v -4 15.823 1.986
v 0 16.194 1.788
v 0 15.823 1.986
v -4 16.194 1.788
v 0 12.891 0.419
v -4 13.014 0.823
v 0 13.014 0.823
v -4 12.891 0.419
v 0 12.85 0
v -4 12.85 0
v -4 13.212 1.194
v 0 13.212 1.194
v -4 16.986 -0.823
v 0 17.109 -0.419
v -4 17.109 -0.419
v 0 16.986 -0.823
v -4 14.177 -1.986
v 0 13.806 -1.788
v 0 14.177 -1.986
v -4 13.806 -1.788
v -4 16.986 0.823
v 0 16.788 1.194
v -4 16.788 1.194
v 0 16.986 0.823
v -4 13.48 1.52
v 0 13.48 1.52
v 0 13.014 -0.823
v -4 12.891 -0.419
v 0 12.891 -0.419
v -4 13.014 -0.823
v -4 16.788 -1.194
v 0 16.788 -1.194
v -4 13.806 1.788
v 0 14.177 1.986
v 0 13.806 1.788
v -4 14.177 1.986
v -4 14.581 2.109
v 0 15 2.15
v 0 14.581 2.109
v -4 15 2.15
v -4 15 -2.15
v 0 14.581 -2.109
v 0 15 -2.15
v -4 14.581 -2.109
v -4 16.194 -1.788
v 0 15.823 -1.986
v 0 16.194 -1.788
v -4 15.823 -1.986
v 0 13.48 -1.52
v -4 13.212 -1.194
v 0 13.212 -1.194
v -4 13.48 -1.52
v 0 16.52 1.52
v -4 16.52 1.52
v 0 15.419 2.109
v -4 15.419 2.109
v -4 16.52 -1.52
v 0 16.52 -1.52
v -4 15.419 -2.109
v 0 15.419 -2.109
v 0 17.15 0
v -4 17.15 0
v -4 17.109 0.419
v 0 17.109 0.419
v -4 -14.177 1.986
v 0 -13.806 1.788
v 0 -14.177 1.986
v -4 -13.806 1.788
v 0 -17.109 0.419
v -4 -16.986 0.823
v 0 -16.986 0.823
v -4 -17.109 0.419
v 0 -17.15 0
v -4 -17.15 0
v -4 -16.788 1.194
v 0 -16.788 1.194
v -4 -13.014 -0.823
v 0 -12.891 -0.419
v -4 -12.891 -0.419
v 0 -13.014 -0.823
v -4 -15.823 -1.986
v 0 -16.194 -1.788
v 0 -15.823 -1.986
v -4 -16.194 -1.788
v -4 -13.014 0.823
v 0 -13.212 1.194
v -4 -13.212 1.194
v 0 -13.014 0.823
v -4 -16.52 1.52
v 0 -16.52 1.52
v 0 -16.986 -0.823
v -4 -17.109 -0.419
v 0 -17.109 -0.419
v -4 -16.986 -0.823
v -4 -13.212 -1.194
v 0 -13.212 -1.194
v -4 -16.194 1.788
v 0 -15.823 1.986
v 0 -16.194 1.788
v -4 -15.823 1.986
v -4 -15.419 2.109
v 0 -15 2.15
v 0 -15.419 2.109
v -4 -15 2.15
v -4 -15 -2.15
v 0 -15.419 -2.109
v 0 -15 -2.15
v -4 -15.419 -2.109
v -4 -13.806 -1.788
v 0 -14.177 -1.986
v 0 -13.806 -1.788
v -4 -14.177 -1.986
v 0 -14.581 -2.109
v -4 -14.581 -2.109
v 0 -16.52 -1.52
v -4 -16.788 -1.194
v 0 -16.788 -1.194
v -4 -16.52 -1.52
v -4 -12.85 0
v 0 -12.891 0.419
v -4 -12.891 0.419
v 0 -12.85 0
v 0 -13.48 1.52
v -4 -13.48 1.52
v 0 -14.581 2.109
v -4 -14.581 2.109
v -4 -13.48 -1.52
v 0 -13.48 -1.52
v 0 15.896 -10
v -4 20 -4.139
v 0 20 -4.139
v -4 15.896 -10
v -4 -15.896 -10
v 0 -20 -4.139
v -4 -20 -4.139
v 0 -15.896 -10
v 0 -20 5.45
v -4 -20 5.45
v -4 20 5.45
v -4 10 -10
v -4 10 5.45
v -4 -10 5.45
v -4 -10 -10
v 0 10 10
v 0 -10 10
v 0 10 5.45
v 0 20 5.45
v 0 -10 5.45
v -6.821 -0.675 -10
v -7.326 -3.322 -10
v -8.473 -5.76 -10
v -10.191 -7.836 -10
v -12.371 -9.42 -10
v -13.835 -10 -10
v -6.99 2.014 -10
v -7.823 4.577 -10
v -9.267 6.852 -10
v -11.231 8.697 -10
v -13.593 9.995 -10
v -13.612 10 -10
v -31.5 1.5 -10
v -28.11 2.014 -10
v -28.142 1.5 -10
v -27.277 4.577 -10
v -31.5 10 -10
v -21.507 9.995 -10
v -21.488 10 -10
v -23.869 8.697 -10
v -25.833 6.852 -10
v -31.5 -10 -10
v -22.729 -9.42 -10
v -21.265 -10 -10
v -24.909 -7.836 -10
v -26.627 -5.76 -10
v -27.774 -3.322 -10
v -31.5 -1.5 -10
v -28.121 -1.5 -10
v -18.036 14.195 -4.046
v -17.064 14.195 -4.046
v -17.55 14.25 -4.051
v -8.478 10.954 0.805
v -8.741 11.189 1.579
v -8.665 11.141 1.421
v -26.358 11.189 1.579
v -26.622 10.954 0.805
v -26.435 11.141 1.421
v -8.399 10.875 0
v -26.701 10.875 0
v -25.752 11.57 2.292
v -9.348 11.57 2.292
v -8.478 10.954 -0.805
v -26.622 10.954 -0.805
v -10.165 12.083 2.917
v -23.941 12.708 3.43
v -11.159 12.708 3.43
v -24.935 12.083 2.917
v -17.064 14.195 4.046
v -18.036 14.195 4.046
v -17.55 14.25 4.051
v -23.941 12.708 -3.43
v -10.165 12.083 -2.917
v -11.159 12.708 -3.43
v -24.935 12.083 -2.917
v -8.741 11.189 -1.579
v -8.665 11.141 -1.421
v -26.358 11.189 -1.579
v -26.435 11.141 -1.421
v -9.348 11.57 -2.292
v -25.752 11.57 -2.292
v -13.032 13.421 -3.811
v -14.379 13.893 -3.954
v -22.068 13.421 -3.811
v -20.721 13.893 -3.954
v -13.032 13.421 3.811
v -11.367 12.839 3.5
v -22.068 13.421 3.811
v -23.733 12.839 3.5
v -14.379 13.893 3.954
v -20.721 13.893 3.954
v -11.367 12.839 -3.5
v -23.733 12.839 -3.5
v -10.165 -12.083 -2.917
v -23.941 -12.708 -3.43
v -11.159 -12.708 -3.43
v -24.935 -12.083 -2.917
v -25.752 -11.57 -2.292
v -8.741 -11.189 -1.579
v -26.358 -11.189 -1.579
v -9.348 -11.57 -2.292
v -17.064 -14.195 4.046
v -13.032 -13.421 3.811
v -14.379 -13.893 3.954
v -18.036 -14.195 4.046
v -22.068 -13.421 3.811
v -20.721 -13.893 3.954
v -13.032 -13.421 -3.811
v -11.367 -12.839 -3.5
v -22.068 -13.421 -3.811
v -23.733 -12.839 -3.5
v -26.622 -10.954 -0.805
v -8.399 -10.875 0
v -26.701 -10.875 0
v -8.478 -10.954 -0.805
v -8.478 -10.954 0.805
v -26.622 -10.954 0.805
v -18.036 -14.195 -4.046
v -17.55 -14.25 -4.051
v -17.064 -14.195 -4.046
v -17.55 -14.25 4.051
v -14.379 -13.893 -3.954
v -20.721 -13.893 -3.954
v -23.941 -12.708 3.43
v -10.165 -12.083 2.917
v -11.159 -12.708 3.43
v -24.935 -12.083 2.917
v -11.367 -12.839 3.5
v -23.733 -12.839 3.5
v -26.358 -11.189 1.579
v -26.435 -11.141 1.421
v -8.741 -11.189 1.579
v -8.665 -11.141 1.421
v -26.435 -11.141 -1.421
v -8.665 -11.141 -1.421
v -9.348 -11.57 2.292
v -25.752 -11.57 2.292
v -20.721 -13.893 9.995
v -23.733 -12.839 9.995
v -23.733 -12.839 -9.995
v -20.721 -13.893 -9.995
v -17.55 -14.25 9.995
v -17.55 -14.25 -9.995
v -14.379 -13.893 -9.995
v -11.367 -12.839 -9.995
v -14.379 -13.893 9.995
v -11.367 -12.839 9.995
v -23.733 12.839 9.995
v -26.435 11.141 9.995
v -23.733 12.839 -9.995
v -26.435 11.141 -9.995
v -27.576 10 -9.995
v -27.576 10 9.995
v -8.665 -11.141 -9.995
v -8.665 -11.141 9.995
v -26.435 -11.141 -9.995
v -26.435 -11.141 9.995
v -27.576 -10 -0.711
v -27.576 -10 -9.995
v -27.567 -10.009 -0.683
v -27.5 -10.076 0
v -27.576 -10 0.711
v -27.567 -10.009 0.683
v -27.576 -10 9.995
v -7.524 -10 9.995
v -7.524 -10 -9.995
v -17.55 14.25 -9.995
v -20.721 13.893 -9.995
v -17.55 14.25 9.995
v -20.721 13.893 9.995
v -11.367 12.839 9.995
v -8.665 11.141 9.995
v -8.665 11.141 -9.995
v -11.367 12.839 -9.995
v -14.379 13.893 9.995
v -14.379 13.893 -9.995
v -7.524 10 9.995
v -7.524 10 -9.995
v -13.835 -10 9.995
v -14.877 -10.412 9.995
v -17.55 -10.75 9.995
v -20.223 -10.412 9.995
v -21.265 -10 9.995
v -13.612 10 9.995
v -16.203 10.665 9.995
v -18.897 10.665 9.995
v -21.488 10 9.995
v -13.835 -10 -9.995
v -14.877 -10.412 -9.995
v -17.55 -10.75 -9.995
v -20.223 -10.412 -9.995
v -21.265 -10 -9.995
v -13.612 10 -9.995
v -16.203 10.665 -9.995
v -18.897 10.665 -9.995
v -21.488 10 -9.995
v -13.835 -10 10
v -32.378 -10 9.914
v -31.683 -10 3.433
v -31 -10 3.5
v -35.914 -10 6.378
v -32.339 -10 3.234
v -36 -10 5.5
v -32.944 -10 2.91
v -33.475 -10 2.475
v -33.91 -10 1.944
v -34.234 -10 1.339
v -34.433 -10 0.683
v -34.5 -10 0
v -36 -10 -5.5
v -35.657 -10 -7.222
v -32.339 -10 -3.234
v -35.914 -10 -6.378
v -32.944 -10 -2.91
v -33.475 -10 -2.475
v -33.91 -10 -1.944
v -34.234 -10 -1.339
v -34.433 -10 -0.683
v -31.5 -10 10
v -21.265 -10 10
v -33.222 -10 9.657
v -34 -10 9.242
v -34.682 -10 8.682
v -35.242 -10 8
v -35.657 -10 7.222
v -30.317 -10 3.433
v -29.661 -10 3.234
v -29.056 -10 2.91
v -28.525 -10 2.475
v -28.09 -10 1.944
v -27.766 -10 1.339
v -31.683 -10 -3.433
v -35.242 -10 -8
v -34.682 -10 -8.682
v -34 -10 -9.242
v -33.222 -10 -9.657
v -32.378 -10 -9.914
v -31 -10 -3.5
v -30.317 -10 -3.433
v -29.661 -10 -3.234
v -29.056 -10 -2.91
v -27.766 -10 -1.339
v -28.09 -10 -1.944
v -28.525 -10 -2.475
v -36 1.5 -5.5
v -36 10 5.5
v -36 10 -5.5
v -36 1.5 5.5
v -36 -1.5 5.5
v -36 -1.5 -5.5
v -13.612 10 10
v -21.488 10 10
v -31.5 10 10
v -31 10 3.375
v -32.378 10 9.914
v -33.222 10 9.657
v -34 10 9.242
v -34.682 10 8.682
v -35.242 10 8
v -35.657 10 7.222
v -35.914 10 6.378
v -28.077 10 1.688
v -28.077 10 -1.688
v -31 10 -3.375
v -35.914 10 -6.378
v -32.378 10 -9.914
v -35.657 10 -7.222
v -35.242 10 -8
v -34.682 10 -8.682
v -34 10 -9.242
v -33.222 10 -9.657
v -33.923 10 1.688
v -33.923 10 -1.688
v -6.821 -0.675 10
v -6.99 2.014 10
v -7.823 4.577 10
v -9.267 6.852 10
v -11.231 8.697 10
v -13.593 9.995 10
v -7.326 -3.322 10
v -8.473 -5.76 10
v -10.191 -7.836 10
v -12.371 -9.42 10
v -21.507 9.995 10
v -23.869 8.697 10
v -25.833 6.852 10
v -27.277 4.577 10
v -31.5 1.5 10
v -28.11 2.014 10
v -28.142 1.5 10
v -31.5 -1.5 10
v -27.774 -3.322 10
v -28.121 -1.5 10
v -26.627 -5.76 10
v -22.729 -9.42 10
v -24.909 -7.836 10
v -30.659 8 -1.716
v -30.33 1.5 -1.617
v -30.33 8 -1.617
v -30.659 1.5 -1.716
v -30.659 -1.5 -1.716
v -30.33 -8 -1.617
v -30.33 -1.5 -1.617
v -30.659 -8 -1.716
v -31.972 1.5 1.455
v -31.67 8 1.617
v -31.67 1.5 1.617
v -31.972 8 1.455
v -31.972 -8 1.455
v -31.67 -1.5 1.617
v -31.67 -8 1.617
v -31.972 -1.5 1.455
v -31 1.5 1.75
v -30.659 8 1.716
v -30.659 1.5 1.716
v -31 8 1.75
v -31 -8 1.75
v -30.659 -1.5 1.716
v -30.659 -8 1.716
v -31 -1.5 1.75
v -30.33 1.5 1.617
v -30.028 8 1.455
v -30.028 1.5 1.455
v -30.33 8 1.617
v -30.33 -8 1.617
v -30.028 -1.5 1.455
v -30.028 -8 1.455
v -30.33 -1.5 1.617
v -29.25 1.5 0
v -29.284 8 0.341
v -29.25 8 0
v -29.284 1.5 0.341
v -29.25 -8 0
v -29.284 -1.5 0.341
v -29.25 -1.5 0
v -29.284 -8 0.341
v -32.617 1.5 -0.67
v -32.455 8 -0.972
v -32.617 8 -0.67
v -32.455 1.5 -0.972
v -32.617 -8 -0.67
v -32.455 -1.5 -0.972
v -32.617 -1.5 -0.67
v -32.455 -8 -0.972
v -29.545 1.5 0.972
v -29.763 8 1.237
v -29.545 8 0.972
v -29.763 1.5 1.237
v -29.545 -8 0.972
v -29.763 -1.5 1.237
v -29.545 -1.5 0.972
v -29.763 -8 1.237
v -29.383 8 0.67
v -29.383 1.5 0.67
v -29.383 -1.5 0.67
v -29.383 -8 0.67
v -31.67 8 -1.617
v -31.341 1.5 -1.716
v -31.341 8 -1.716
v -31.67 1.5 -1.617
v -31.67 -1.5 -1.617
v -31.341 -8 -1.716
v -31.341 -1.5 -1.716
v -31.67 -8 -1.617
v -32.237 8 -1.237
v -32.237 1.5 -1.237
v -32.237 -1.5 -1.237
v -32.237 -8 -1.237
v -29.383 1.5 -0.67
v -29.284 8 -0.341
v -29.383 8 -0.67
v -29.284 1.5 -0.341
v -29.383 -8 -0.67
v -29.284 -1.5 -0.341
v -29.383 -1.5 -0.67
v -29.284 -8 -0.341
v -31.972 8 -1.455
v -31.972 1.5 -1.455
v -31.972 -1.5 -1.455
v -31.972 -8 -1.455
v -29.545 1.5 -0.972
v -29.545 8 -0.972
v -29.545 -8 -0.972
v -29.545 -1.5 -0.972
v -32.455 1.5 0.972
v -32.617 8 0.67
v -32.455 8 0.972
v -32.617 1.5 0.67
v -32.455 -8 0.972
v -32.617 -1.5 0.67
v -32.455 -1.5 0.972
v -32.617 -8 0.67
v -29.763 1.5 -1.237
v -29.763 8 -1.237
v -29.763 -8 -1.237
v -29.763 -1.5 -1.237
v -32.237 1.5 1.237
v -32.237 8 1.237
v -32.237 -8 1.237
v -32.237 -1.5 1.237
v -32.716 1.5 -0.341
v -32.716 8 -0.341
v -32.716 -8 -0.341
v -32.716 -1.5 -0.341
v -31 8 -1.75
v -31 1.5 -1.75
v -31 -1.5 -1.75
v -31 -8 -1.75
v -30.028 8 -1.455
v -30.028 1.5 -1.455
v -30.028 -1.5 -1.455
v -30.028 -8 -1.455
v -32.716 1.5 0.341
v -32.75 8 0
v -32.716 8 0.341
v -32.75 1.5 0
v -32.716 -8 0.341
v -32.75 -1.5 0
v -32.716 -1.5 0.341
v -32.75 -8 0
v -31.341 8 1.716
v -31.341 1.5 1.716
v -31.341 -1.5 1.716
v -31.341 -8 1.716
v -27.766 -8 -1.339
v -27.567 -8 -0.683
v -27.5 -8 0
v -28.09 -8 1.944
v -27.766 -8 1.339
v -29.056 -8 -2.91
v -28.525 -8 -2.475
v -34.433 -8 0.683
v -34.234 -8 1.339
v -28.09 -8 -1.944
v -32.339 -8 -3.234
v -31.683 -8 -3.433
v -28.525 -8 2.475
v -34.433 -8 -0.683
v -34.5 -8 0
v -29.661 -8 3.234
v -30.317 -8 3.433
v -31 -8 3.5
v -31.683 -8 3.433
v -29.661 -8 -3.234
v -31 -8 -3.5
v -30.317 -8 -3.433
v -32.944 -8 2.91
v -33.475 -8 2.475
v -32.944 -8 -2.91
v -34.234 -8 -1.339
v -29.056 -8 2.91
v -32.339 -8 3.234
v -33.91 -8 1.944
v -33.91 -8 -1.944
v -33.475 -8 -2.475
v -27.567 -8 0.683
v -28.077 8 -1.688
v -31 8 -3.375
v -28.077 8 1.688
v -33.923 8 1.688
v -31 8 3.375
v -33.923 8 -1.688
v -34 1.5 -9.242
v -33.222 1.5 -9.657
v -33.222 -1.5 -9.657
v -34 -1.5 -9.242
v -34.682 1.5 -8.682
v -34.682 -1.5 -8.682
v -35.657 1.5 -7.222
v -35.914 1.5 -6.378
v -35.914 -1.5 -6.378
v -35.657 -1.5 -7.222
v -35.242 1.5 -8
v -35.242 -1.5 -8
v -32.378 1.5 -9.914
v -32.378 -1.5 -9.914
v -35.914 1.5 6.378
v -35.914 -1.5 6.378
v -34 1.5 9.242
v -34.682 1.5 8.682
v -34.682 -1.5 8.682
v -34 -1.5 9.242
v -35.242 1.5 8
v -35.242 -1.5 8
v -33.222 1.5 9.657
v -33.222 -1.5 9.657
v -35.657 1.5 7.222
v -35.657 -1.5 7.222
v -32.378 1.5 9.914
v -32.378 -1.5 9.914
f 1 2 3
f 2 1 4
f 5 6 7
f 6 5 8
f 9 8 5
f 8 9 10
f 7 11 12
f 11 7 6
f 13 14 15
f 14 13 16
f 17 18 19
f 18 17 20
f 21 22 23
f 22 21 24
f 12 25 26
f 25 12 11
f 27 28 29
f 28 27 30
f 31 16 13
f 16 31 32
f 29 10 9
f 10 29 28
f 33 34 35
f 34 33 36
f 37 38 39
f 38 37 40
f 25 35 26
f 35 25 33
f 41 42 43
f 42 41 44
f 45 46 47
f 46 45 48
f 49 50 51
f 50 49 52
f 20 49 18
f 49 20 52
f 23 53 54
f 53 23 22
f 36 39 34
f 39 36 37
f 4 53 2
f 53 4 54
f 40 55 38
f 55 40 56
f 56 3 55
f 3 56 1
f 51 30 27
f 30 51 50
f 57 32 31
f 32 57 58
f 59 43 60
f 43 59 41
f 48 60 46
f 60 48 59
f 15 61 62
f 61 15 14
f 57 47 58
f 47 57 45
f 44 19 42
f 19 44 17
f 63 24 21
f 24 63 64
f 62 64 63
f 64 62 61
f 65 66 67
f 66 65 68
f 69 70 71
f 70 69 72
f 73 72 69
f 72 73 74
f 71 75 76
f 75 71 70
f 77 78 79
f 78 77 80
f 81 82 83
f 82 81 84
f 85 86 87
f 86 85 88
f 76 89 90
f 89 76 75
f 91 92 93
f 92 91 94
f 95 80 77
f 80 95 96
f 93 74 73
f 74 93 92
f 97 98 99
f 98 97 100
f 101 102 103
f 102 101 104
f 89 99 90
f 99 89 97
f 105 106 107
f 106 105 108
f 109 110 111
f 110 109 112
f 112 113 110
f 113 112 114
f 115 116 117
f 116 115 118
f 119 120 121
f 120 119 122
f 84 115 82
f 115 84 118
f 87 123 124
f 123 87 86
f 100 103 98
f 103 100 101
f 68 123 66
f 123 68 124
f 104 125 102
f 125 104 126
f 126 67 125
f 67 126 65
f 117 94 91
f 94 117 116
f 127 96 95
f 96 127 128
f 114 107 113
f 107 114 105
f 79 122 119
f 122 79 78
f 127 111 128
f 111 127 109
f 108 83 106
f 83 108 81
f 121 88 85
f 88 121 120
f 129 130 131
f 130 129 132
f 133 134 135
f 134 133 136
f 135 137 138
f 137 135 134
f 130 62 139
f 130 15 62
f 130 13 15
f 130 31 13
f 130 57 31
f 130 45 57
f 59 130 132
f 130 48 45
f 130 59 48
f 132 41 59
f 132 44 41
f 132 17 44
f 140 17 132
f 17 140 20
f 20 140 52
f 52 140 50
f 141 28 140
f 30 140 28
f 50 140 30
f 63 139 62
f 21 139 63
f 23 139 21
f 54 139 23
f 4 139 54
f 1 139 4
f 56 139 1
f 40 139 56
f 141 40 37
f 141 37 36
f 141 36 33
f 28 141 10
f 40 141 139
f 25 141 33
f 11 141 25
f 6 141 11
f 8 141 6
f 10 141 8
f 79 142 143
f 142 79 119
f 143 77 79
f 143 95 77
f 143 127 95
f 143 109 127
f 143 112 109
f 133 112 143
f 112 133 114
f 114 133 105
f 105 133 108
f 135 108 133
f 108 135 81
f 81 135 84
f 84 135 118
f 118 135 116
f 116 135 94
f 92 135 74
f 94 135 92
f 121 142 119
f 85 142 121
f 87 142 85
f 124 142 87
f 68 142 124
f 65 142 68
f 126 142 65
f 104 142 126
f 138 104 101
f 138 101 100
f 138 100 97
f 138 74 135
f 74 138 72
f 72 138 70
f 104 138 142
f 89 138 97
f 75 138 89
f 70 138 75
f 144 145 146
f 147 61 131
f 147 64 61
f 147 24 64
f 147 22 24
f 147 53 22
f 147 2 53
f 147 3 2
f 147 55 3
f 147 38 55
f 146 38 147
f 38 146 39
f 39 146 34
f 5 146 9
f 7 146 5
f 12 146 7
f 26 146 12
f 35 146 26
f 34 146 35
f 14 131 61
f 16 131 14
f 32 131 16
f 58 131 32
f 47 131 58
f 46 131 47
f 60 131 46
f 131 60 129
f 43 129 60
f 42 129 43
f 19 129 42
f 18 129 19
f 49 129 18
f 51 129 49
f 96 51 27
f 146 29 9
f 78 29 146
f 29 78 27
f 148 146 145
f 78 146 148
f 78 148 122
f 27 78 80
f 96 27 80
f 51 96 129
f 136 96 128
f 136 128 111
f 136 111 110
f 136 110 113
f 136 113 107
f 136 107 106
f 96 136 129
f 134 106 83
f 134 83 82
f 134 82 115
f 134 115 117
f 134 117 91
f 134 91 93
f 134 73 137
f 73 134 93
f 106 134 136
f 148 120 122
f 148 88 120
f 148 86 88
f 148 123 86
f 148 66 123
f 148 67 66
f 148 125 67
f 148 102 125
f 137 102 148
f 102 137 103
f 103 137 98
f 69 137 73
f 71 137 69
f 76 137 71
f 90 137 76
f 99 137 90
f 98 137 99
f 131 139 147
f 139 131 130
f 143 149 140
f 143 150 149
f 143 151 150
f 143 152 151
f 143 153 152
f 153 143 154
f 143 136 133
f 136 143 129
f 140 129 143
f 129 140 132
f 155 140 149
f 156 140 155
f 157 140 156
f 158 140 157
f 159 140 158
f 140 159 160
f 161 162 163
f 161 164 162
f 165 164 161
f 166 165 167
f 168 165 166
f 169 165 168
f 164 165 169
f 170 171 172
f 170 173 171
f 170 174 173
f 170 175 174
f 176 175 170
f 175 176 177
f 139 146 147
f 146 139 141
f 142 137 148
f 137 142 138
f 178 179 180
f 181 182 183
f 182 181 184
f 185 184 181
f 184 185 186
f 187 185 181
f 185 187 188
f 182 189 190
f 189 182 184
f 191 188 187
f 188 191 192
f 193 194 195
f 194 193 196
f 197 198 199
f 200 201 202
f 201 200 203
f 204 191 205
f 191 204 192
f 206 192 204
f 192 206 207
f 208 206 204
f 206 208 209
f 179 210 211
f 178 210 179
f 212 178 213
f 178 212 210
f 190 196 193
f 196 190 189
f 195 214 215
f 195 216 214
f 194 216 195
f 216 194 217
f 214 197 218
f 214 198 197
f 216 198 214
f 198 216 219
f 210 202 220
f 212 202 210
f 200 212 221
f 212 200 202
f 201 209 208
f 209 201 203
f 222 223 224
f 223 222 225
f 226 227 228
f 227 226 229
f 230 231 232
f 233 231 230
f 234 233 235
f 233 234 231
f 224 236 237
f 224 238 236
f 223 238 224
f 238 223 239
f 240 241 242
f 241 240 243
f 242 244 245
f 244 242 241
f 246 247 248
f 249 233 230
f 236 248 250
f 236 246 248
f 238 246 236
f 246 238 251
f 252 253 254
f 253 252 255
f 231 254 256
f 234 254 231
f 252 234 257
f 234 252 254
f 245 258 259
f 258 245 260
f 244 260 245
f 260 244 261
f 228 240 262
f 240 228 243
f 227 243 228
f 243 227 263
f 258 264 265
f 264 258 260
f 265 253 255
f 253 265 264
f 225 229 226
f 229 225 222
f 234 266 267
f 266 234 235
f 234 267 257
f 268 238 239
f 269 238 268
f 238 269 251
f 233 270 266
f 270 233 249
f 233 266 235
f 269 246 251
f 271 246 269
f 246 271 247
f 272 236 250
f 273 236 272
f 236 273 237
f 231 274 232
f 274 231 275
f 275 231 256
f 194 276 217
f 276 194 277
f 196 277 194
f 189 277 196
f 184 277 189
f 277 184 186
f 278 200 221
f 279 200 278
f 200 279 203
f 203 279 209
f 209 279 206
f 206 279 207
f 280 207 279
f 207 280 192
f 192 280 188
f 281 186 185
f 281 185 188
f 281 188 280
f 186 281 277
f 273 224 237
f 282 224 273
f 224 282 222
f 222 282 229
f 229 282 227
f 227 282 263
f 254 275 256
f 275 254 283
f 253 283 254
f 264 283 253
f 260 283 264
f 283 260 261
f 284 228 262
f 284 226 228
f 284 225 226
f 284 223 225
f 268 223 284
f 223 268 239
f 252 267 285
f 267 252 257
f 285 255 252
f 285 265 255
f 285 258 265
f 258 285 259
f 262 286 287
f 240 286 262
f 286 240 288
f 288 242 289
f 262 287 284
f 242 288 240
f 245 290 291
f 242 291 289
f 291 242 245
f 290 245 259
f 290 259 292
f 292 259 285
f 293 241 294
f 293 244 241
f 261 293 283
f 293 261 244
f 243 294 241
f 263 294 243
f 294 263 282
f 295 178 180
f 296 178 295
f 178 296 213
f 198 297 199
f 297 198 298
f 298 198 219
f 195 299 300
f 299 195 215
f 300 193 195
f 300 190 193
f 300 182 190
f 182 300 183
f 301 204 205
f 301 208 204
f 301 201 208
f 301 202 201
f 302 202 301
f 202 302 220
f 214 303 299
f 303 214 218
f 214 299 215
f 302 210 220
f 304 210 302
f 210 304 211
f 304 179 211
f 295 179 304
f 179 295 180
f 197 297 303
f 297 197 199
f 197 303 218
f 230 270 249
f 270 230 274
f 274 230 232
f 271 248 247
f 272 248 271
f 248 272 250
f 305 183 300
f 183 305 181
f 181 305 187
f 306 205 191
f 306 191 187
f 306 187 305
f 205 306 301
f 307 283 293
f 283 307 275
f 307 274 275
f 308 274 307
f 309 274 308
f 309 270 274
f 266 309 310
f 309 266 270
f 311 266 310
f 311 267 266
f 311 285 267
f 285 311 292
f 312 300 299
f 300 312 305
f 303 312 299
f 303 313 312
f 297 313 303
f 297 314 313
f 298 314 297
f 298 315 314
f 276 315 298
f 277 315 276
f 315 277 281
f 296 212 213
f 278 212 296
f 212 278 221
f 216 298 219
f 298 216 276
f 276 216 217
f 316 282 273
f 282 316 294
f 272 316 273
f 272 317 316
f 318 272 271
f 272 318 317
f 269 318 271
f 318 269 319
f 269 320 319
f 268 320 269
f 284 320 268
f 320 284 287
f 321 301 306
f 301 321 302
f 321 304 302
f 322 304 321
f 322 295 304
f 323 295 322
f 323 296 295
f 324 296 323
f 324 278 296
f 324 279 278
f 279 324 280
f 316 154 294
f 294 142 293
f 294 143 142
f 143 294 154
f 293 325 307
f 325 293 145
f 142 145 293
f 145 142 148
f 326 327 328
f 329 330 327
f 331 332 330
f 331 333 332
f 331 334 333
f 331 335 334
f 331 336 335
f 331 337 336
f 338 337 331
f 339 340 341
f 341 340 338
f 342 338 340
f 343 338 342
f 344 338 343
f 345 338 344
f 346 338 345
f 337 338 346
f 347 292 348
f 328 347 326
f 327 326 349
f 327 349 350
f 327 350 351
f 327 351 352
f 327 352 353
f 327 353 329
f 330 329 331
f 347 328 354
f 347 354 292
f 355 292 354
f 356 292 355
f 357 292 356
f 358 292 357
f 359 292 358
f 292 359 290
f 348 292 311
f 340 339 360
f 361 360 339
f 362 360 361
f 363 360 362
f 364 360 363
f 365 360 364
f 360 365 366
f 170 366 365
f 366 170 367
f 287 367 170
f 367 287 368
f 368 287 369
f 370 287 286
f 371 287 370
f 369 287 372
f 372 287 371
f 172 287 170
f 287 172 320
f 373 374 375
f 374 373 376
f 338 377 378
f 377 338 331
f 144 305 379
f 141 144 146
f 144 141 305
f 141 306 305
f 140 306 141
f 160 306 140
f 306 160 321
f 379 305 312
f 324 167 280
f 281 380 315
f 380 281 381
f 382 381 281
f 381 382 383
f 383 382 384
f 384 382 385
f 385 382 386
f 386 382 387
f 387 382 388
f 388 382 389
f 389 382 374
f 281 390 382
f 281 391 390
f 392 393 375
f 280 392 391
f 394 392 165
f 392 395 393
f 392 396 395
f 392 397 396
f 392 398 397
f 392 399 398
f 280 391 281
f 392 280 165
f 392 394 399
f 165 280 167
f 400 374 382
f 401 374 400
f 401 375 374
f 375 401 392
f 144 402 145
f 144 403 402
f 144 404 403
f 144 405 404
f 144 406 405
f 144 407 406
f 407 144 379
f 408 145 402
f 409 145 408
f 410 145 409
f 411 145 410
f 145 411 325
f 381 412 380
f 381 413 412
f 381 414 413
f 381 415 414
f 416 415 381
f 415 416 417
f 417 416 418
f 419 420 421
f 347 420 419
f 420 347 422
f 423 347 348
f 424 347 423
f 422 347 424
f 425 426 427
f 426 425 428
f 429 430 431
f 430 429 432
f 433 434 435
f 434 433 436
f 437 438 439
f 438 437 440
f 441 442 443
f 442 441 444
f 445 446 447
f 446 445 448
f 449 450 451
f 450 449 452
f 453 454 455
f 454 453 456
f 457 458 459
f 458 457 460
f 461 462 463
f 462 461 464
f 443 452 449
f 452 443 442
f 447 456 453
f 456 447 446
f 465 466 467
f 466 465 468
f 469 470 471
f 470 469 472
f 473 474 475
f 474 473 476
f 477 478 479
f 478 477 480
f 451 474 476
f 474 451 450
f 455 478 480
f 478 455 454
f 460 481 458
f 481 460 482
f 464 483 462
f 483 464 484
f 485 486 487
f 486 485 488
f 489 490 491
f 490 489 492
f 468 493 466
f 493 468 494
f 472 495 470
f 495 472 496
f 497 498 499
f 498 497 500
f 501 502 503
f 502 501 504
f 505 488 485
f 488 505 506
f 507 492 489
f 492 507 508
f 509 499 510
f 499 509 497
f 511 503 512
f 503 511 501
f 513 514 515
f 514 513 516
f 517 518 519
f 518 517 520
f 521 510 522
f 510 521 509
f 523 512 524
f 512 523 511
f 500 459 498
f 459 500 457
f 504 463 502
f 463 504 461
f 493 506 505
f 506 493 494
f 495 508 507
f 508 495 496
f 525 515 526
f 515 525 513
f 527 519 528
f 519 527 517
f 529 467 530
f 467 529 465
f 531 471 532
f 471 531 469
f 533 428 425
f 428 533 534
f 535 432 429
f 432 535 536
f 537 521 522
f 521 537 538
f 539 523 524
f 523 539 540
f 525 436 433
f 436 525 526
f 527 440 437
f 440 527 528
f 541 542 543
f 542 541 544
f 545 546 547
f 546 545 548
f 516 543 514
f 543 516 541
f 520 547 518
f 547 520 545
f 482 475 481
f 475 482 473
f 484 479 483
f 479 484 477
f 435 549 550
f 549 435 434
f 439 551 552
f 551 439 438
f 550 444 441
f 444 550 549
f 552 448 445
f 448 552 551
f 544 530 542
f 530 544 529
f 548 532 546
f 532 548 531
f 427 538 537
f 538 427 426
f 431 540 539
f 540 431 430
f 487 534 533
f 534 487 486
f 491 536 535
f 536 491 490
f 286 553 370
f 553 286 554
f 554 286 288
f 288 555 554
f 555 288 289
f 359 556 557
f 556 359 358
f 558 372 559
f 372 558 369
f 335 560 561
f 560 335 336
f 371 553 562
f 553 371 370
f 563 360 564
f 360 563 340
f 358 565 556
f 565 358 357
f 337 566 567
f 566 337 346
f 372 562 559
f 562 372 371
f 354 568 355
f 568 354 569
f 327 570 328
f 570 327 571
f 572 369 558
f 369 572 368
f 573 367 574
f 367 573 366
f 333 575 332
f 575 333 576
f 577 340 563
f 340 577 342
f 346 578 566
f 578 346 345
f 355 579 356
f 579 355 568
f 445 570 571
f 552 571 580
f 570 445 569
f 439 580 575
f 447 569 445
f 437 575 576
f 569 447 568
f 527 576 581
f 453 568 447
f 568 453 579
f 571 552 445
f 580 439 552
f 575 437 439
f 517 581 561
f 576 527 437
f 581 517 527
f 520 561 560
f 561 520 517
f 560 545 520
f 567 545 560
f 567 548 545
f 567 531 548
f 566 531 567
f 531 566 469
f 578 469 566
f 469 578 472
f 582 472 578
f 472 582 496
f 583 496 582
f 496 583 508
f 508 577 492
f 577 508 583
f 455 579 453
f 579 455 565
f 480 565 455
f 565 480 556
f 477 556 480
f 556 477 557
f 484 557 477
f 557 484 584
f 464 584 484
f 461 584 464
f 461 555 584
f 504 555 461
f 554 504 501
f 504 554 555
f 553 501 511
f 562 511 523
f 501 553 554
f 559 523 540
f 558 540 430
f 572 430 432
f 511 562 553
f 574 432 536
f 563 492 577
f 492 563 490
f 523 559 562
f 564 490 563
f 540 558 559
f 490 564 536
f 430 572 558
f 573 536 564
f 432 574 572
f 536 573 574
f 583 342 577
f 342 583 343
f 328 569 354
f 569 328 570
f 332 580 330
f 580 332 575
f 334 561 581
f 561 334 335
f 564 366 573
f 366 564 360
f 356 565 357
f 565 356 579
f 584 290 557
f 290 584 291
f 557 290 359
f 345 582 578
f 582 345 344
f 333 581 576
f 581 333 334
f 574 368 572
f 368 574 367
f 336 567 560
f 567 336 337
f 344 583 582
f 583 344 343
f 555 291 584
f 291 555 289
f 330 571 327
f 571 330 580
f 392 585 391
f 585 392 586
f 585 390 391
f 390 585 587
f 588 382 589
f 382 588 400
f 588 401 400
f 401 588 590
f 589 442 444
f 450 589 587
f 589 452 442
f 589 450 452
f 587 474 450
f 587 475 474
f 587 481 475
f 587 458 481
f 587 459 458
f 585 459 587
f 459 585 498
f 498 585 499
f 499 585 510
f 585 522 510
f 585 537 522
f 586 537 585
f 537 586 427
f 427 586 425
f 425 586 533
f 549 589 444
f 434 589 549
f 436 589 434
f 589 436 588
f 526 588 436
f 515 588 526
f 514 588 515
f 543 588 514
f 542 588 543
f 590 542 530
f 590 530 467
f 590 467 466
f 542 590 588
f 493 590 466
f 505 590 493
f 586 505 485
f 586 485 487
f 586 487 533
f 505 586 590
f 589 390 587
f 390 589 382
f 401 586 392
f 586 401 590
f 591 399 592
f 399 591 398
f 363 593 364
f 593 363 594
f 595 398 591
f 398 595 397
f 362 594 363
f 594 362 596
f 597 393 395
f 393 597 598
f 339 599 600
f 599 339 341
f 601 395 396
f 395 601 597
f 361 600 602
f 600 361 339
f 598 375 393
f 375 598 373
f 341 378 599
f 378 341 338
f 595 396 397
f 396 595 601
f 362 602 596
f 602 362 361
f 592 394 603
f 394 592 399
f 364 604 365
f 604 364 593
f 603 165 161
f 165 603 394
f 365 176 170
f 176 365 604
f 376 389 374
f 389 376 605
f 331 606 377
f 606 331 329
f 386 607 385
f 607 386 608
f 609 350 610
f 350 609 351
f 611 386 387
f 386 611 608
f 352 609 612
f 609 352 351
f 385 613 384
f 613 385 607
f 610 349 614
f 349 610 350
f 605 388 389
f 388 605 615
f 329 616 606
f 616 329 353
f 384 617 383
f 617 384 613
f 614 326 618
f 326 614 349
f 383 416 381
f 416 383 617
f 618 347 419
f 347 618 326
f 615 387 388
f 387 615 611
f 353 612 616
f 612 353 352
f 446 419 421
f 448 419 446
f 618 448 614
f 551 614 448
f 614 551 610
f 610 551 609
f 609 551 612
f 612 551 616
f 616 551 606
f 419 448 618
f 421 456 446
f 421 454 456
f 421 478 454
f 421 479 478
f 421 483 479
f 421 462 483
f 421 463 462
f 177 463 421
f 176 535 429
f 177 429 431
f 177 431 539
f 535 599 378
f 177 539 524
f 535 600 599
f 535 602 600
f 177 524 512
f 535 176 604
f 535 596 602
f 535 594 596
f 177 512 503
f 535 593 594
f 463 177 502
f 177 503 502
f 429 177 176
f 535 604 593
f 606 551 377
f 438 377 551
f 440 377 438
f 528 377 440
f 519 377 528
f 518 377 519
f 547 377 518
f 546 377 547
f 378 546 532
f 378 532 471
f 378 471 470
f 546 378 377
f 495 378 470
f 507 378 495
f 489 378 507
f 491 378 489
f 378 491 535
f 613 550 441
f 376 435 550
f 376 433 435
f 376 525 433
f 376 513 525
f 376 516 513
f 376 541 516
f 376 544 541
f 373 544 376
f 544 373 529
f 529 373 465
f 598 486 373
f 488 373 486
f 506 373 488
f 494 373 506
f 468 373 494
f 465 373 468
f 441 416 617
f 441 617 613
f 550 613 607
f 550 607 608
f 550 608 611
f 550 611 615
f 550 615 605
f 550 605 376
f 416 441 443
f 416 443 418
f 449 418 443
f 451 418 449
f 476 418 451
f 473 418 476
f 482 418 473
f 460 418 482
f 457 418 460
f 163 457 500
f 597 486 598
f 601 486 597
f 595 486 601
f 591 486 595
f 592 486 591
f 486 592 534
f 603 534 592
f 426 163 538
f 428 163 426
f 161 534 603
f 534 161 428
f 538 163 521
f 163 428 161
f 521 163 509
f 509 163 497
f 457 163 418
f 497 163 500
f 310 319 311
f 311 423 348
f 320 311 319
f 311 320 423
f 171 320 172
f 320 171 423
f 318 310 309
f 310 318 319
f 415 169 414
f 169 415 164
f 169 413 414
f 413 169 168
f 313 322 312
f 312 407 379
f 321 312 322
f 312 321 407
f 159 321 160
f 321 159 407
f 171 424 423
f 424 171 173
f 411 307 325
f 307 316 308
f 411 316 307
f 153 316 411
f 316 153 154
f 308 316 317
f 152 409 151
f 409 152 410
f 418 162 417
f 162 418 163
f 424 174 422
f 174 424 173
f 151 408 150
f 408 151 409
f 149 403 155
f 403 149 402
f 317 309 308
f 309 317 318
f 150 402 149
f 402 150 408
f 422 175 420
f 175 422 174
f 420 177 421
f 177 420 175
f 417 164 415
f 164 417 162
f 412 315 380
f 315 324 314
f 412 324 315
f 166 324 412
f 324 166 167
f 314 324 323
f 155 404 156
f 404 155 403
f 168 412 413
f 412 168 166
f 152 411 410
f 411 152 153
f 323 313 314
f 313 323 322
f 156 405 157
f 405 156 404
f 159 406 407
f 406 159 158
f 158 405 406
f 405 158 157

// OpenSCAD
lm8uu_length = 15;
lm8luu_length = 45;
lm12uu_length = 20;
height = 36;
lm8uu_diam = 15.5;
lm12uu_diam = 21.5;
extrusion_width = 20;

retaining_hole_offset = 5;
retaining_hole_diam = 3.5;
retaining_hole_countersink_diam = 7;
retaining_hole_countersink_depth = 2;
retaining_hole_nuttrap_depth = 4.1;

//block_width = extrusion_width + extrusion_width/5;
block_width = 20;
barrel_thickness = 7;
barrel_offset = 6+(11.8+11.3)/2;
gap_width = 3;

//mount_width = extrusion_width * 2 + extrusion_width/2;
mount_width = extrusion_width * 2;
mount_height = 4;
mount_length = lm12uu_length/2; // len/2 = center
mount_hole_spacing = extrusion_width*1.5;
mount_hole_diam = 4.3;
mount_screwhead_clearance_diam = 8.25;

corner_round_diam = 9;
DEBUG = 0;

if (true)
{   
    rotate([90 * (1-DEBUG), 0, -90 * (1-DEBUG)])
    lm12uu_holder();
}

module lm8uu_holder()
{
    bearing_holder(length = lm8uu_length);
}

module lm8luu_holder()
{
    bearing_holder(length = lm8luu_length);
}

module lm12uu_holder()
{
    bearing_holder(length = lm12uu_length, diameter = lm12uu_diam);
}

module bearing_holder2(length = lm8uu_length, diameter = lm8uu_diam)
{
        union()
        {
            // main block
            translate([0, 0, height/2])
            cube([block_width, length, height], center=true);

            translate([0, 0, barrel_offset])
            translate([0, -0.05/2, 0])
            rotate([90, 0, 0])
            cylinder(d=diameter + barrel_thickness, h=length-0.05, center=true, $fn=28);
        }
}

module bearing_holder(length = lm8uu_length, diameter = lm8uu_diam)
{
    // mount plate
    color("greenyellow") difference()
    {
        translate([0, 0, mount_height/2])
        cube([mount_width, length, mount_height], center=true);
        
        // mount holes
        for(i=[-1, 1])
            translate([mount_hole_spacing/2*i, -length/2+mount_length, 0])
            cylinder(d=mount_hole_diam, h=50, $fn=32, center=true);
        
        // remove the mount plate above the hole, we don't need it
        translate([0, 50, 0])
        translate([0, mount_hole_diam/2+3.3, 0])
        cube([100, 100, 100], center=true);
        
        // cut the corner at the bottom
        for(i=[-1, 1])
            translate([mount_hole_spacing/2*i, 0, mount_height/2])
            translate([7*i, -length/2, 0])
            rotate([0, 0, -35*i])
            cube([10, 10, mount_height+2], center=true);
    }
    
    color("greenyellow") difference()
    {
        union()
        {
            // main block
            translate([0, 0, height/2])
            cube([block_width, length, height], center=true);

            // barrel
            difference()
            {
                translate([0, 0, barrel_offset])
                rotate([90, 0, 0])
                // need the tiny epsilon to avoid manifold errors in stl
                cylinder(d=diameter+barrel_thickness, h=length-0.01, center=true, $fn=28);
                
                // cut everything lower than the mountplate
                translate([0, 0, -50])
                translate([0, 0, mount_height])
                cube([100, 100, 100], center=true);
                
                // make clearance for the heads of the mounting screws to be inserted
                for(i=[-1, 1])
                    translate([mount_hole_spacing/2*i, -length/2+mount_length, 0])
                    cylinder(d=mount_screwhead_clearance_diam, h=height*2+1, $fn=32, center=true);
            }
        }
        
        // square cutout at top
        translate([0, 0, height/2+height/4])
        cube([gap_width, length+1, height/2+0.1], center=true);
        
        // hollow out barrel
        translate([0, 0, barrel_offset])
        rotate([90, 0, 0])
        cylinder(d=diameter, h=length+0.1, center=true, $fn=25);
        
        // retaining hole for squeezing lm8uu
        translate([0, 0, height])
        translate([0, 0, -retaining_hole_offset])
        {
            rotate([0, 90, 0])
            cylinder(d=retaining_hole_diam, h=block_width+1, $fn=32, center=true);
            
            // countersinking for retaining hole screwhead on one side
            translate([block_width/2, 0, 0])
            translate([0.1, 0, 0])     // epsilon
            rotate([0, 0, 180])
            rotate([0, 90, 0])
            cylinder(d=retaining_hole_countersink_diam, h=retaining_hole_countersink_depth+0.1, $fn=32);
            
            // nut trap on the other side
            translate([-block_width/2, 0, 0])
            translate([-0.1, 0, 0])     // epsilon
            rotate([0, 90, 0])
            rotate([0, 0, 360/6/2])
            cylinder(r=5.5 / cos(180 / 6) / 2 + 0.2, h=retaining_hole_nuttrap_depth+0.1, $fn=6, center=true);
        }
        
        // rounded corners
        for(i=[-1,1])
        {
            translate([0, 0, height])
            translate([0, 0, -corner_round_diam/2])
            translate([0, length/2 * i, 0])
            translate([0, -corner_round_diam/2 * i, 0])
            rounded_corner(diam = corner_round_diam, side = i);
        }
    }
}

module rounded_corner(diam, side)
{
    difference()
    {
        cube([500, diam+0.1, diam+0.1], center=true);
        
        rotate([0, 90, 0])
        cylinder(d=diam, h=501, $fn=32, center=true);
        
        // cut off the bottom half
        translate([0, 0, -diam/2])
        cube([502, diam+1, diam], center=true);
        
        // cut off either the left or right side depending on side variable
        translate([0, diam/2 * -side, 0])
        cube([502, diam, diam+1], center=true);
    }
}
